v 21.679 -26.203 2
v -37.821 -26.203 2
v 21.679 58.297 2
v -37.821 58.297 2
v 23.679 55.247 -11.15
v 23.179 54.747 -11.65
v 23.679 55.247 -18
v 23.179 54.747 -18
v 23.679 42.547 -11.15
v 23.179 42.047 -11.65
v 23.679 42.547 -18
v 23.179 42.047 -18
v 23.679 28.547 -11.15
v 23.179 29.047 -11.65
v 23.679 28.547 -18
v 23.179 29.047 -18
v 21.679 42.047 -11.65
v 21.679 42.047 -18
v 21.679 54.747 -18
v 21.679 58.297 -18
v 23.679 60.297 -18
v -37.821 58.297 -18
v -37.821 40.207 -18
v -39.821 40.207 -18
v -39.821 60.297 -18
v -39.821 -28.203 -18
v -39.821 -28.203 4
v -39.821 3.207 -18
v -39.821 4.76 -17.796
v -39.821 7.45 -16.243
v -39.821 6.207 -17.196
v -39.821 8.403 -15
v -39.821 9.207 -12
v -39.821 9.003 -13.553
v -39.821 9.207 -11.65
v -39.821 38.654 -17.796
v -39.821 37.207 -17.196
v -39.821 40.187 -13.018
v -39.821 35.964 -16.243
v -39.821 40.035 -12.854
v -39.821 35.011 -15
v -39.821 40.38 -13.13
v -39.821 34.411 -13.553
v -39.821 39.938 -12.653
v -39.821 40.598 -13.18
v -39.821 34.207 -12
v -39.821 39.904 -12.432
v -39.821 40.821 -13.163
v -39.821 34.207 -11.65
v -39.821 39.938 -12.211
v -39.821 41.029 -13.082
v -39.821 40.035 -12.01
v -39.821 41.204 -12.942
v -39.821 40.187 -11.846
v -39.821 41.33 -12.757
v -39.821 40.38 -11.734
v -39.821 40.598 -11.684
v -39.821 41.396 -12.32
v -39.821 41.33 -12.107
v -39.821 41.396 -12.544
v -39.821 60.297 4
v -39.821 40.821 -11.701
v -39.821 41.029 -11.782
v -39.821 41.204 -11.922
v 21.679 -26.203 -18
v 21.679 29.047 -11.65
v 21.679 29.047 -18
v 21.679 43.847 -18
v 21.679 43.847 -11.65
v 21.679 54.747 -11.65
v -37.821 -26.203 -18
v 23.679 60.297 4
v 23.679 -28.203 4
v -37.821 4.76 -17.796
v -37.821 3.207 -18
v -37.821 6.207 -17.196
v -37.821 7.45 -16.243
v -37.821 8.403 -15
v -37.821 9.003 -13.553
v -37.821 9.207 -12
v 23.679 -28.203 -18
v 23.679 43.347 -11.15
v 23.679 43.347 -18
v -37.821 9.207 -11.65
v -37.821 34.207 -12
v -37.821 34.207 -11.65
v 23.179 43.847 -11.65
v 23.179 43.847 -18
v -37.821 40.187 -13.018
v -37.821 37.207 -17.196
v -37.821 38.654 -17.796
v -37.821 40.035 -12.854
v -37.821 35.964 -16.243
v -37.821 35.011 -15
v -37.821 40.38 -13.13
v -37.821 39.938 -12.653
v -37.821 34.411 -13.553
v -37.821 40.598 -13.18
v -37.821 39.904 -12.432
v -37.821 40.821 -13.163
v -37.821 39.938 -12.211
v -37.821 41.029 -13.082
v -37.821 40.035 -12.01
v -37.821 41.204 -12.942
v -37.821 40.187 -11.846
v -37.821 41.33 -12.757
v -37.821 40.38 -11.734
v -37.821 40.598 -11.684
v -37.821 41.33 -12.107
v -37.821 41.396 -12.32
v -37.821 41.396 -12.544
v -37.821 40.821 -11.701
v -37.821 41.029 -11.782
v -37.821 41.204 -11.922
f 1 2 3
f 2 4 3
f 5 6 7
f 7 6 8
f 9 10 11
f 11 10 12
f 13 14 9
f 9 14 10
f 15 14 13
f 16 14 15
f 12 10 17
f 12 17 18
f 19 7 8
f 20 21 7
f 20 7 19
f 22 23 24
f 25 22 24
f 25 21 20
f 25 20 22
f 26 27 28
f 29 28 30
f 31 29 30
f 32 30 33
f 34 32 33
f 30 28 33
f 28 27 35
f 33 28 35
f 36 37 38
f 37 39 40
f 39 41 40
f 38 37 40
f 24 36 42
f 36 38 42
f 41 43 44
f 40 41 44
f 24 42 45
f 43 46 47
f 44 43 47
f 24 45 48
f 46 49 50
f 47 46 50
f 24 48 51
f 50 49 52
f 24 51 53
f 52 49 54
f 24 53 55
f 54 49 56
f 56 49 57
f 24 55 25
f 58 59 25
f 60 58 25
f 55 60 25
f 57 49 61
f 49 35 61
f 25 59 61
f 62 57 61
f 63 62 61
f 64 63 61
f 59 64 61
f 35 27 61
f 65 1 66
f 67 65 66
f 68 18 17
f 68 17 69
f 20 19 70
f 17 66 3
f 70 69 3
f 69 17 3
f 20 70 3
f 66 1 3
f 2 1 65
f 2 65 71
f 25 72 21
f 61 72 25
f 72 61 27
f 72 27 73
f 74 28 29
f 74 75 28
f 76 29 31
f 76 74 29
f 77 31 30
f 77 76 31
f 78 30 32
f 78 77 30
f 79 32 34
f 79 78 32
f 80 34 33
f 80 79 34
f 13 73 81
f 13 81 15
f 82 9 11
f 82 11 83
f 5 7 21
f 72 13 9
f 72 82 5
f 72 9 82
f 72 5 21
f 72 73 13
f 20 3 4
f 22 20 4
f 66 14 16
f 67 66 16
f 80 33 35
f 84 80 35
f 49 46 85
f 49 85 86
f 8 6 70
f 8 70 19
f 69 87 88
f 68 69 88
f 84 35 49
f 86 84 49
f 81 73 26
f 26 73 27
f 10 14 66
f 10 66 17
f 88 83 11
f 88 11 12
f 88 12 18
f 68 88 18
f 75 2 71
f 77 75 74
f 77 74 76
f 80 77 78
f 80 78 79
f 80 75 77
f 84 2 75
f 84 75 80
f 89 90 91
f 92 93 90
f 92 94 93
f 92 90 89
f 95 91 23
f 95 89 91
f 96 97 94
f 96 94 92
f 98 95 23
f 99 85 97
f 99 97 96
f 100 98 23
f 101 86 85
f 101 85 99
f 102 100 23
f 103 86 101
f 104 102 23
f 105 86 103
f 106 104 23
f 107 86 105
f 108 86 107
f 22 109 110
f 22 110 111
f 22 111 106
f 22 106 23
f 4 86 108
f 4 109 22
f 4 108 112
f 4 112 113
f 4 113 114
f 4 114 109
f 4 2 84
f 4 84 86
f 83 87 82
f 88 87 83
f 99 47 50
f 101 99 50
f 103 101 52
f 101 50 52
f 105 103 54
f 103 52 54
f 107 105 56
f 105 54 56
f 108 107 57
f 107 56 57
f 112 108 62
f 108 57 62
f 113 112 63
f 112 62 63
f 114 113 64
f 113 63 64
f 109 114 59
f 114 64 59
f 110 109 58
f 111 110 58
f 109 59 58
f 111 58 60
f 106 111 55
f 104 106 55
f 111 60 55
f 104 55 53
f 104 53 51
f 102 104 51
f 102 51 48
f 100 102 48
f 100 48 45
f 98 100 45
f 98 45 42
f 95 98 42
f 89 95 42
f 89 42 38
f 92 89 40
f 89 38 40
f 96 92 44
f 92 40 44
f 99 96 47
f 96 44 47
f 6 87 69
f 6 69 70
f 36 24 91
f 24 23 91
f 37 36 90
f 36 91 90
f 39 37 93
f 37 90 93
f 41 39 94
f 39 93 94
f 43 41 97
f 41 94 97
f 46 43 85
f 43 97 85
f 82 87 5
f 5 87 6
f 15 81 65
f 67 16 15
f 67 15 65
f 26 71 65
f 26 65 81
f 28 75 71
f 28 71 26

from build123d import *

# Parameters (mm, degrees)
SKETCH2_W           = 63.5
SKETCH2_H           = 88.5
BOSS_EXTRUDE1_DEPTH = 2
SKETCH3_W           = 63.5
SKETCH3_H           = 88.5
SKETCH3_W_2         = 59.5
SKETCH3_H_2         = 84.5
BOSS_EXTRUDE2_DEPTH = 20
SKETCH4_W           = 6.35
SKETCH4_H           = 13
SKETCH4_H_2         = 10.9
CUT_EXTRUDE1_DEPTH  = 2
CHAMFER1_SIZE       = 0.5
SKETCH5_R           = 0.75
SKETCH5_W           = 6.35
SKETCH5_H           = 25
CUT_EXTRUDE3_DEPTH  = 2
FILLET1_R           = 6


with BuildPart() as part:
    # Sketch2 → Boss-Extrude1 (new body)
    with BuildSketch(Plane.XY.offset(2)):
        with Locations((-8.071244, 16.046786)):
            Rectangle(SKETCH2_W, SKETCH2_H)
    extrude(amount=BOSS_EXTRUDE1_DEPTH)

    # Sketch3 → Boss-Extrude2 (add)
    with BuildSketch(Plane(origin=(0, 0, 2), x_dir=(-1, 0, 0), z_dir=(0, 0, -1))):
        with Locations((8.071244, 16.046786)):
            Rectangle(SKETCH3_W, SKETCH3_H)
        with Locations((8.071244, 16.046786)):
            Rectangle(SKETCH3_W_2, SKETCH3_H_2, mode=Mode.SUBTRACT)
    extrude(amount=BOSS_EXTRUDE2_DEPTH)

    # Sketch4 → Cut-Extrude1 (cut)
    with BuildSketch(Plane(origin=(23.678756, 0, 0), x_dir=(0, 0, -1), z_dir=(1, 0, 0))):
        with Locations((14.825, 35.546786)):
            Rectangle(SKETCH4_W, SKETCH4_H)
        with Locations((14.825, 49.296786)):
            Rectangle(SKETCH4_W, SKETCH4_H_2)
    extrude(amount=-CUT_EXTRUDE1_DEPTH, mode=Mode.SUBTRACT)

    # Chamfer1
    chamfer1_edges = [part.edges().sort_by_distance(p)[0] for p in [
        (23.678756, 42.046786, -14.825),
        (23.678756, 35.546786, -11.65),
        (23.678756, 29.046786, -14.825),
        (23.678756, 54.746786, -14.825),
        (23.678756, 49.296786, -11.65),
        (23.678756, 43.846786, -14.825),
    ]]
    chamfer(chamfer1_edges, length=CHAMFER1_SIZE)

    # Sketch5 → Cut-Extrude3 (cut)
    with BuildSketch(Plane.ZY.offset(39.821244)):
        with Locations(Location((-12.431991388, 40.654286, 0), (0, 0, 270))):
            Circle(SKETCH5_R)
        with Locations((-14.825, 21.706977335)):
            Rectangle(SKETCH5_W, SKETCH5_H)
    extrude(amount=-CUT_EXTRUDE3_DEPTH, mode=Mode.SUBTRACT)

    # Fillet1
    fillet1_edges = [part.edges().sort_by_distance(p)[0] for p in [
        (-38.821244, 34.206977335, -18),
        (-38.821244, 9.206977335, -18),
    ]]
    fillet(fillet1_edges, radius=FILLET1_R)


solid = part.part
